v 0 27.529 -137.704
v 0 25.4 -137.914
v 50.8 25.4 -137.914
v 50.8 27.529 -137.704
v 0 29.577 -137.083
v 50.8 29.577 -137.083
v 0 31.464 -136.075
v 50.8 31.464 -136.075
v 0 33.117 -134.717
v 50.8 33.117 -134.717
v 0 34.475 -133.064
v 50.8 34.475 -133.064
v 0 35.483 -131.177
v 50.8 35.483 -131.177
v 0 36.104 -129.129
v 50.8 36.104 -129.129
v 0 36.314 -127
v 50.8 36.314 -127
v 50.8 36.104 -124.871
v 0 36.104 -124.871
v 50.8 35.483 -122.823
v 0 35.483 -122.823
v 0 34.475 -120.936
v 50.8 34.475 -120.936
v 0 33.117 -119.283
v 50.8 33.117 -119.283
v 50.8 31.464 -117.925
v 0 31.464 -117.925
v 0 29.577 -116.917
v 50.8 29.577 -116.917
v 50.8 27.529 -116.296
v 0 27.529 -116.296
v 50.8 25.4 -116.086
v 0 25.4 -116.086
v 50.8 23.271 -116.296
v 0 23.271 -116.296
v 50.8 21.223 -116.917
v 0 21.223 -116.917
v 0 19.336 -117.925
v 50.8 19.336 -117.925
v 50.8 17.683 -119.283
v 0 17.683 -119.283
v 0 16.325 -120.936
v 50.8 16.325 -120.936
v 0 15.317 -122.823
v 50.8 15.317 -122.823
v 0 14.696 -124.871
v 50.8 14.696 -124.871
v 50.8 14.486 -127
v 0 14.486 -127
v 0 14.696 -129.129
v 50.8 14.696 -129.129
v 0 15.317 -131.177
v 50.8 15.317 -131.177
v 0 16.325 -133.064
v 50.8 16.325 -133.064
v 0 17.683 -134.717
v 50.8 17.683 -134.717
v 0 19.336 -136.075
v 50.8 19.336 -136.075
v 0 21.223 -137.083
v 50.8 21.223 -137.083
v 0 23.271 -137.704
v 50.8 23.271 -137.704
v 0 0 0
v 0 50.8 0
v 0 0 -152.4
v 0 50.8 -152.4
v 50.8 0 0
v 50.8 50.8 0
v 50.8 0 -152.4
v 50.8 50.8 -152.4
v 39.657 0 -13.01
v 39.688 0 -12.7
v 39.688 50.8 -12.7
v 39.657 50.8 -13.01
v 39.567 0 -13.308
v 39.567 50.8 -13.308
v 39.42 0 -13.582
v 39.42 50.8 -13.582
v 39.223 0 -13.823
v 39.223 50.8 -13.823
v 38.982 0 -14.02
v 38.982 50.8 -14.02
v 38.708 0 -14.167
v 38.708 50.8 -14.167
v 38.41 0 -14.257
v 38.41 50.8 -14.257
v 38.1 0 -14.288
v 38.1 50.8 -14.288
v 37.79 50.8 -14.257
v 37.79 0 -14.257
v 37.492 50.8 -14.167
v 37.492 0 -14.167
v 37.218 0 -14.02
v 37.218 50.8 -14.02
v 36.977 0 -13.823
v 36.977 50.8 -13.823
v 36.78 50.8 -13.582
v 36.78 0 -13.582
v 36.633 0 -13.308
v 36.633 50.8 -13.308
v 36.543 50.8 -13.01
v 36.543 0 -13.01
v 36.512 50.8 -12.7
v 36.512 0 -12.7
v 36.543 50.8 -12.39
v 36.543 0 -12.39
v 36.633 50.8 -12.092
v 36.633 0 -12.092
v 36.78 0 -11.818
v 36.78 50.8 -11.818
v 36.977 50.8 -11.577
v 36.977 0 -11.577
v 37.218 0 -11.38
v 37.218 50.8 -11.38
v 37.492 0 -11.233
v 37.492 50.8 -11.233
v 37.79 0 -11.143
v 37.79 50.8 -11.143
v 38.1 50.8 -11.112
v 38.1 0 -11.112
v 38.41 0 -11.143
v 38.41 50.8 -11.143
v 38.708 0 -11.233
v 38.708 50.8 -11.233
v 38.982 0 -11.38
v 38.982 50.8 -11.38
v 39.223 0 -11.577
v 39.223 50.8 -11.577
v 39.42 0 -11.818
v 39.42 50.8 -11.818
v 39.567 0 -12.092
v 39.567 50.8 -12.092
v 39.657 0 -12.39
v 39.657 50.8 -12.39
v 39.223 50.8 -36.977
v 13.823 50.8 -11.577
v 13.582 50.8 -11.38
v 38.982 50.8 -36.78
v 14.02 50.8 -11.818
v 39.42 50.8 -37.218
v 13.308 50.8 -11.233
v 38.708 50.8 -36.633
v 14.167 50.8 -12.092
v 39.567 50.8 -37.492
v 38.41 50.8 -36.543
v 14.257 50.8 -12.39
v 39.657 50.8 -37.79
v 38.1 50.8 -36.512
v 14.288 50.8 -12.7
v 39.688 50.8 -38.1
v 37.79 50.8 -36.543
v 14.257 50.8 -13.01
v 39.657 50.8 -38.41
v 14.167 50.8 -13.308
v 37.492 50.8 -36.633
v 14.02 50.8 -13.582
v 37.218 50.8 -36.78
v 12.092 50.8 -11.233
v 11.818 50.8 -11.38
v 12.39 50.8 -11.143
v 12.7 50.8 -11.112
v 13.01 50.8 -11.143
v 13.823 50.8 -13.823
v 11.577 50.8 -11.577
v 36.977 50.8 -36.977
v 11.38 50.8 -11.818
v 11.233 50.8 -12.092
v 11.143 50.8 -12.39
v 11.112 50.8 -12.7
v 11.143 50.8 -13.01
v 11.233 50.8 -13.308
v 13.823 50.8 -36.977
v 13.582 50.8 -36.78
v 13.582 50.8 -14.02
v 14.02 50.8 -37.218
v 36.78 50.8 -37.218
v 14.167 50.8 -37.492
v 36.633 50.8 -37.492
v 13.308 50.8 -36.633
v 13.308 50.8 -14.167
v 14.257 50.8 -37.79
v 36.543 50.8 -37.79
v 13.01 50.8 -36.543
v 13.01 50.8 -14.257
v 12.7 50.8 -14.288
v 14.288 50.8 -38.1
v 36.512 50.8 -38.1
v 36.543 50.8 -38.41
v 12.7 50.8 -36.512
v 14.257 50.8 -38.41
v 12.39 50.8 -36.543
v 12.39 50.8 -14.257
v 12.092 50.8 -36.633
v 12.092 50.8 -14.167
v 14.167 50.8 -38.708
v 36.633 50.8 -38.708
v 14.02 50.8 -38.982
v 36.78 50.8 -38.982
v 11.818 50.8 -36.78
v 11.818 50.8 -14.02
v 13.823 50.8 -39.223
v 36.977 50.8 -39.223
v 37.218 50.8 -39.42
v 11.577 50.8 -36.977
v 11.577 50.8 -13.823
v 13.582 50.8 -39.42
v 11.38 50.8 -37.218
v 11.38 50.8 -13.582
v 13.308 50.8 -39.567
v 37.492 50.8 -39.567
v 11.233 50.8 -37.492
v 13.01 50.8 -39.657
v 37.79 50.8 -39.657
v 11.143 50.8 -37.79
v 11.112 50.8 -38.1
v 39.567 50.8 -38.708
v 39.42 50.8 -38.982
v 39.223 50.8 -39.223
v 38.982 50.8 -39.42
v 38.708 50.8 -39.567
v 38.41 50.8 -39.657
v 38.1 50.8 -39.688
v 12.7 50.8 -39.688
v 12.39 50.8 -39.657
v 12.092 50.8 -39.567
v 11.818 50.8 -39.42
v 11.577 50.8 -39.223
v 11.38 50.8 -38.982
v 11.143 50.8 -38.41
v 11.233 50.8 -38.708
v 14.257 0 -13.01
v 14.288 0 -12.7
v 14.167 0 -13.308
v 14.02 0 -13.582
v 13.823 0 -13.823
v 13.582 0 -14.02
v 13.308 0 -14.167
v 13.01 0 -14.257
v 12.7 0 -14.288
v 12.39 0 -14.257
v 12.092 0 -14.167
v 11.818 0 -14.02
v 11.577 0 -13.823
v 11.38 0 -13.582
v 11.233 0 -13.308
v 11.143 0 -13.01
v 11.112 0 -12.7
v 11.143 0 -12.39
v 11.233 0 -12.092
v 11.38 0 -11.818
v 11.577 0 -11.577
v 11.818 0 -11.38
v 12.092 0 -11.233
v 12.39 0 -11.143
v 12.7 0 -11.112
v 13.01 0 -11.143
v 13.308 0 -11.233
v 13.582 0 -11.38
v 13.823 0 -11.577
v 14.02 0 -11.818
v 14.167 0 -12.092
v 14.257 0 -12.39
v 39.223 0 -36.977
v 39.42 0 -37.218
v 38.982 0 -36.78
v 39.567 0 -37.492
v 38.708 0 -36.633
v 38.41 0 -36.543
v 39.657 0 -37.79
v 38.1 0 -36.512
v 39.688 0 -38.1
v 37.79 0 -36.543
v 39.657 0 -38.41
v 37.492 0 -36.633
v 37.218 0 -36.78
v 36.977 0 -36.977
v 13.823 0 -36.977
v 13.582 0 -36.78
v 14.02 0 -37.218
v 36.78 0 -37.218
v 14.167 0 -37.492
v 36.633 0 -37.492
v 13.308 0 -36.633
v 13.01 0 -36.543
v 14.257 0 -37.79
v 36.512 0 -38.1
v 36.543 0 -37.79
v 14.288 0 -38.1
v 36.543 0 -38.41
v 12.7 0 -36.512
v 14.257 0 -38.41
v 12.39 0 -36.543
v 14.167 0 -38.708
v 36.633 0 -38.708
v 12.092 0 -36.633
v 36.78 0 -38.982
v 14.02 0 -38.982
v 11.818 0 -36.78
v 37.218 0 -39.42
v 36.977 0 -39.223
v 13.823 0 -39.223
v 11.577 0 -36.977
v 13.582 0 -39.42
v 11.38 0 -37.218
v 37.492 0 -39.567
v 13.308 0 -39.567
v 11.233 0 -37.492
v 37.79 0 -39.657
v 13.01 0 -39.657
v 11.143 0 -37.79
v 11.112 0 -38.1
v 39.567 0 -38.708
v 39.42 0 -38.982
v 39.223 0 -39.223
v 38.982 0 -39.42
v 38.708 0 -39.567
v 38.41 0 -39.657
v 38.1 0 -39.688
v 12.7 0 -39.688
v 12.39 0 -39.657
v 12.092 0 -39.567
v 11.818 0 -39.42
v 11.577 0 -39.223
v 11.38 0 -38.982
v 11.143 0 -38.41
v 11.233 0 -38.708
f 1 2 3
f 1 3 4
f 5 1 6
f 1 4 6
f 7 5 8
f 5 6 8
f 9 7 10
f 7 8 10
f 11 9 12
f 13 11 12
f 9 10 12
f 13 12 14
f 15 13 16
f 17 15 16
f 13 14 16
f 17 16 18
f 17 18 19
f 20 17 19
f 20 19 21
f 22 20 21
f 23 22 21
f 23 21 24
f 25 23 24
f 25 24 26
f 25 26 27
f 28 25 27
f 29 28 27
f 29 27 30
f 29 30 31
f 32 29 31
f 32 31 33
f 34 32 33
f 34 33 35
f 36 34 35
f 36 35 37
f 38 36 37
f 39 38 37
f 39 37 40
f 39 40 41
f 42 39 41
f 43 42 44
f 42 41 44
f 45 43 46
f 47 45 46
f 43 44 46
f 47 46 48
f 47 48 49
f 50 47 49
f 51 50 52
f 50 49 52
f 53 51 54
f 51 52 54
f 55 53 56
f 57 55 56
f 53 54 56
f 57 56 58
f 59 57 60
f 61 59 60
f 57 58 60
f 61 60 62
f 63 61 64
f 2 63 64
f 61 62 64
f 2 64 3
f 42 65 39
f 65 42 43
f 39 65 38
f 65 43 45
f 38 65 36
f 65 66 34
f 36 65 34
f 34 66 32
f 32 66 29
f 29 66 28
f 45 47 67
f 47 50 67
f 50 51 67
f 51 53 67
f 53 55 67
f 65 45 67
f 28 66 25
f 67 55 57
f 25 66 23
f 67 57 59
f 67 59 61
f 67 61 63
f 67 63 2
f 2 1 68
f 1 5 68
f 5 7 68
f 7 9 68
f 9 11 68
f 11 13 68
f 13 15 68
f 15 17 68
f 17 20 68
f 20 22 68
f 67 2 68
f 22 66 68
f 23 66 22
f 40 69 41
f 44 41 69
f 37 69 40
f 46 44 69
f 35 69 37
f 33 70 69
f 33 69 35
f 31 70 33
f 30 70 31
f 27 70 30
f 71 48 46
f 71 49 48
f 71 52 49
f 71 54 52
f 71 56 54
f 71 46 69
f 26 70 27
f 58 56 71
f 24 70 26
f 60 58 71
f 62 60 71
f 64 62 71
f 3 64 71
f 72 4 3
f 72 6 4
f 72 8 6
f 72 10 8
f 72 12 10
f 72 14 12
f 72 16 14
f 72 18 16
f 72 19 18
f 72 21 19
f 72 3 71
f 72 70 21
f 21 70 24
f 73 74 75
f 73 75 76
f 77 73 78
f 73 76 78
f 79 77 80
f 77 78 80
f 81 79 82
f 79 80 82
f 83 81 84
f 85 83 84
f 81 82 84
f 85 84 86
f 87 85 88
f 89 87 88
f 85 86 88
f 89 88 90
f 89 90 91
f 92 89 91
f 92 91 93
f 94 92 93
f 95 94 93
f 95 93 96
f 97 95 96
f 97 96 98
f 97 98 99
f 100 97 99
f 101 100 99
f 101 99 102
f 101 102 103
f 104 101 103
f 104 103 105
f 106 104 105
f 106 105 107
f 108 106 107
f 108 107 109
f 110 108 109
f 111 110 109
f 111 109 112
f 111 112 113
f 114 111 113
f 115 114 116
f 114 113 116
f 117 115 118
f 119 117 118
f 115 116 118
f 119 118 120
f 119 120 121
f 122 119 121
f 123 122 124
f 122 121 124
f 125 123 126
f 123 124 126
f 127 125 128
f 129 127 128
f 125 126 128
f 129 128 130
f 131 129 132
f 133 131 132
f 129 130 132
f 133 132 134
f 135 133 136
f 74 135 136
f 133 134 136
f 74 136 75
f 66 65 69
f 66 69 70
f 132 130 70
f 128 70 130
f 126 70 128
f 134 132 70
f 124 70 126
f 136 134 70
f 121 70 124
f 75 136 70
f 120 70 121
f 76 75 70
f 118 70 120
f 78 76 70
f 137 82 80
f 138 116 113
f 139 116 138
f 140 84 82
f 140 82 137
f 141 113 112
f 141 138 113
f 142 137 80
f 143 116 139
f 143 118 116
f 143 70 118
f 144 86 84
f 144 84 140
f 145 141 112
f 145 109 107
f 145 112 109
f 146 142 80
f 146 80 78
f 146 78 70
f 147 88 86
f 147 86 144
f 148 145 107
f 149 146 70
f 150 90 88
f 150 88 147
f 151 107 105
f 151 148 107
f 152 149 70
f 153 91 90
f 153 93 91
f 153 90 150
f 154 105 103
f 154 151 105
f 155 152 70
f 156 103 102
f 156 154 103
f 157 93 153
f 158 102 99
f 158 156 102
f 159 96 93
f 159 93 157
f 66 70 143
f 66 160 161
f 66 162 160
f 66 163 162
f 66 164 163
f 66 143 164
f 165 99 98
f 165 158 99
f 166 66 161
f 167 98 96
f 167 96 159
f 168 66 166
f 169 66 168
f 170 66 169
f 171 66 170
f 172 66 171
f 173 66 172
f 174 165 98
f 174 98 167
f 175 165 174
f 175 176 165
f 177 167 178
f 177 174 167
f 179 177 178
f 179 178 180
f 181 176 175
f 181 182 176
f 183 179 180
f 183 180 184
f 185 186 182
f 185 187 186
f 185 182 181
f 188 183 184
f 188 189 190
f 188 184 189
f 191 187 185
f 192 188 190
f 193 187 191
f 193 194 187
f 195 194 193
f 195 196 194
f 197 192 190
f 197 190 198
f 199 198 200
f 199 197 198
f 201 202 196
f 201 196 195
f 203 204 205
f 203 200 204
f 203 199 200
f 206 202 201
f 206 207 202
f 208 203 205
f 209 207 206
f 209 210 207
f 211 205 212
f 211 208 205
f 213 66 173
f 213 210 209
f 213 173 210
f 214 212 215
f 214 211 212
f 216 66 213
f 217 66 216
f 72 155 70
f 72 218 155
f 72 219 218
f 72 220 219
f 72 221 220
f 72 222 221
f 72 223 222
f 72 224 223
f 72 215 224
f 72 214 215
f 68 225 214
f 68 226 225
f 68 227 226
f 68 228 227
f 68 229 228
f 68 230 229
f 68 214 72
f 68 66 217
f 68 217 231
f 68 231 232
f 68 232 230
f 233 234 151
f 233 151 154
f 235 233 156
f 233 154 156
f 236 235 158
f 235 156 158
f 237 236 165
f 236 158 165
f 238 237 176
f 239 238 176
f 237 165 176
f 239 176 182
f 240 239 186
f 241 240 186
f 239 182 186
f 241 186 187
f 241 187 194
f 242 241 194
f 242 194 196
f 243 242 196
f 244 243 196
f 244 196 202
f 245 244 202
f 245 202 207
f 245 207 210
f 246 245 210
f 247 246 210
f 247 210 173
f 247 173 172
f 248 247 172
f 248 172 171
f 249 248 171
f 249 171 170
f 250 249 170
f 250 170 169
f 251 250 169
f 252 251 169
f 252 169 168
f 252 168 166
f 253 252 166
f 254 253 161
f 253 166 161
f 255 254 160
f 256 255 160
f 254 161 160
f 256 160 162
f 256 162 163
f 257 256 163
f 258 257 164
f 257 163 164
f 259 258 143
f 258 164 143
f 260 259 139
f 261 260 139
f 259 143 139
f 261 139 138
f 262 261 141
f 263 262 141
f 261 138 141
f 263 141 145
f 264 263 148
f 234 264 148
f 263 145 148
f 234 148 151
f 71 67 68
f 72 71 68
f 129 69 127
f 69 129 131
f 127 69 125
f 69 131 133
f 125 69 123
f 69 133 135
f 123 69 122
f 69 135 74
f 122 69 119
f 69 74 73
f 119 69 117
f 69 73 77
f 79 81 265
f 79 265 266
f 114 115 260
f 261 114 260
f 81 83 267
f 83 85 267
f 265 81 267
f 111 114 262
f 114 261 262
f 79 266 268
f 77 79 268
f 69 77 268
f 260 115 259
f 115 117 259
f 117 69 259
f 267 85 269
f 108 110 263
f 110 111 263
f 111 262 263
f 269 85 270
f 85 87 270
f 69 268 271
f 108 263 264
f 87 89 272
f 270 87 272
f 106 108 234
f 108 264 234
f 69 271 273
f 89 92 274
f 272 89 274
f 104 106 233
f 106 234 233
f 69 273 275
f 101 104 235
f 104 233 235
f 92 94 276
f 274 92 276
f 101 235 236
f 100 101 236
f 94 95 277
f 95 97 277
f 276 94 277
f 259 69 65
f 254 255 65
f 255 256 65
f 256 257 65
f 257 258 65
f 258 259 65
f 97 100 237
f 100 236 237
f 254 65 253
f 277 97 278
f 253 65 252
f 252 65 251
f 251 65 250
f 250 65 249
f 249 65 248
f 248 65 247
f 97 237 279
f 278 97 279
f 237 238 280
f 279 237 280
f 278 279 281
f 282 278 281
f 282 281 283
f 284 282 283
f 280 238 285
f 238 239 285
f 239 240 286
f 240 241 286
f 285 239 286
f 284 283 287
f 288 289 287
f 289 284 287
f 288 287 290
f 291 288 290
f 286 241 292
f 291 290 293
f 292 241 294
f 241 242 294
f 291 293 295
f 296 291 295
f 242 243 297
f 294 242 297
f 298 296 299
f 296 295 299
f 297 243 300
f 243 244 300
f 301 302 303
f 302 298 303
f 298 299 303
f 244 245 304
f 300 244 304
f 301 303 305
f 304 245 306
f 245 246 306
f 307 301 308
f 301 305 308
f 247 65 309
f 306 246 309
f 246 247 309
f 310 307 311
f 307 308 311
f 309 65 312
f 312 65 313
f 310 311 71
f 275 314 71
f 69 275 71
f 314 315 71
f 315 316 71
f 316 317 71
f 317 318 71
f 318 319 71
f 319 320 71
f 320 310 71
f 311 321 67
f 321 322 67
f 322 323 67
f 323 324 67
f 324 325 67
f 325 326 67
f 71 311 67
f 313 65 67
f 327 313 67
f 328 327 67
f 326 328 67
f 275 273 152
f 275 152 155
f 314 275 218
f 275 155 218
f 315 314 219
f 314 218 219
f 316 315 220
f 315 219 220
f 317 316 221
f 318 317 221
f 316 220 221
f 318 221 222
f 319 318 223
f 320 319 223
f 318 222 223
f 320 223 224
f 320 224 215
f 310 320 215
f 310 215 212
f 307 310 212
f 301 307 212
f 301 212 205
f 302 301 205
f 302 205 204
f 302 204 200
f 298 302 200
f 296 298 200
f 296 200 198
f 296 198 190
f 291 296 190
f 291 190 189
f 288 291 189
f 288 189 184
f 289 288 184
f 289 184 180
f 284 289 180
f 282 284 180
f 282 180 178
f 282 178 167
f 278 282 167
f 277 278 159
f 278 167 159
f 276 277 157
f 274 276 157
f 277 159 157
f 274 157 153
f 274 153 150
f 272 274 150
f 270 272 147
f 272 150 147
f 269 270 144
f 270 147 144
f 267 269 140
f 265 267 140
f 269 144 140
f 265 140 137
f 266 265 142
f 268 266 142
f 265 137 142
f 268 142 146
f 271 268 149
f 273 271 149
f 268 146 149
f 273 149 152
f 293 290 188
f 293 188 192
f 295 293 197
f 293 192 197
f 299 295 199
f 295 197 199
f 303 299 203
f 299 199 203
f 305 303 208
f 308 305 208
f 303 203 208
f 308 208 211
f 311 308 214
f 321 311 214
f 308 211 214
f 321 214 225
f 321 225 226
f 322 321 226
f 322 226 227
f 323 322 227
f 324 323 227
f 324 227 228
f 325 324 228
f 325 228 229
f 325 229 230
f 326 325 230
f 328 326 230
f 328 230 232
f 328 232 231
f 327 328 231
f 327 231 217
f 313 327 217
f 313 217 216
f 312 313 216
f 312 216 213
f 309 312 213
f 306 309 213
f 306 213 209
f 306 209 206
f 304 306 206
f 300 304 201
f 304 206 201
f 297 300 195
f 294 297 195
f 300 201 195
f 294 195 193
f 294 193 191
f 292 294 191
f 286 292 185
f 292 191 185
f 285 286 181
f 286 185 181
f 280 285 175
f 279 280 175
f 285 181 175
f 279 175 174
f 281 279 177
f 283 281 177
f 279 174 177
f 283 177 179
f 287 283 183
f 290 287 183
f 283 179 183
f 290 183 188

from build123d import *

# Parameters (mm, degrees)
SKETCH1_W           = 152.4
SKETCH1_H           = 50.8
BOSS_EXTRUDE1_DEPTH = 50.8
SKETCH2_R           = 10.9140625
CUT_EXTRUDE1_DEPTH  = 51.8
SKETCH3_R           = 1.5875
CUT_EXTRUDE2_DEPTH  = 51.8


with BuildPart() as part:
    # Sketch1 → Boss-Extrude1 (new body)
    with BuildSketch(Plane(origin=(0, 0, 0), x_dir=(0, 0, -1), z_dir=(1, 0, 0))):
        with Locations((76.2, 25.4)):
            Rectangle(SKETCH1_W, SKETCH1_H)
    extrude(amount=BOSS_EXTRUDE1_DEPTH)

    # Sketch2 → Cut-Extrude1 (cut, through all)
    with BuildSketch(Plane(origin=(50.8, 0, 0), x_dir=(0, 0, -1), z_dir=(1, 0, 0))):
        with Locations((127, 25.4)):
            Circle(SKETCH2_R)
    extrude(amount=-CUT_EXTRUDE1_DEPTH, mode=Mode.SUBTRACT)

    # Sketch3 → Cut-Extrude2 (cut, through all)
    with BuildSketch(Plane(origin=(0, 50.8, 0), x_dir=(1, 0, 0), z_dir=(0, 1, 0))):
        with Locations((12.7, 38.1)):
            Circle(SKETCH3_R)
        with Locations((38.1, 38.1)):
            Circle(SKETCH3_R)
        with Locations((12.7, 12.7)):
            Circle(SKETCH3_R)
        with Locations((38.1, 12.7)):
            Circle(SKETCH3_R)
    extrude(amount=-CUT_EXTRUDE2_DEPTH, mode=Mode.SUBTRACT)


solid = part.part
